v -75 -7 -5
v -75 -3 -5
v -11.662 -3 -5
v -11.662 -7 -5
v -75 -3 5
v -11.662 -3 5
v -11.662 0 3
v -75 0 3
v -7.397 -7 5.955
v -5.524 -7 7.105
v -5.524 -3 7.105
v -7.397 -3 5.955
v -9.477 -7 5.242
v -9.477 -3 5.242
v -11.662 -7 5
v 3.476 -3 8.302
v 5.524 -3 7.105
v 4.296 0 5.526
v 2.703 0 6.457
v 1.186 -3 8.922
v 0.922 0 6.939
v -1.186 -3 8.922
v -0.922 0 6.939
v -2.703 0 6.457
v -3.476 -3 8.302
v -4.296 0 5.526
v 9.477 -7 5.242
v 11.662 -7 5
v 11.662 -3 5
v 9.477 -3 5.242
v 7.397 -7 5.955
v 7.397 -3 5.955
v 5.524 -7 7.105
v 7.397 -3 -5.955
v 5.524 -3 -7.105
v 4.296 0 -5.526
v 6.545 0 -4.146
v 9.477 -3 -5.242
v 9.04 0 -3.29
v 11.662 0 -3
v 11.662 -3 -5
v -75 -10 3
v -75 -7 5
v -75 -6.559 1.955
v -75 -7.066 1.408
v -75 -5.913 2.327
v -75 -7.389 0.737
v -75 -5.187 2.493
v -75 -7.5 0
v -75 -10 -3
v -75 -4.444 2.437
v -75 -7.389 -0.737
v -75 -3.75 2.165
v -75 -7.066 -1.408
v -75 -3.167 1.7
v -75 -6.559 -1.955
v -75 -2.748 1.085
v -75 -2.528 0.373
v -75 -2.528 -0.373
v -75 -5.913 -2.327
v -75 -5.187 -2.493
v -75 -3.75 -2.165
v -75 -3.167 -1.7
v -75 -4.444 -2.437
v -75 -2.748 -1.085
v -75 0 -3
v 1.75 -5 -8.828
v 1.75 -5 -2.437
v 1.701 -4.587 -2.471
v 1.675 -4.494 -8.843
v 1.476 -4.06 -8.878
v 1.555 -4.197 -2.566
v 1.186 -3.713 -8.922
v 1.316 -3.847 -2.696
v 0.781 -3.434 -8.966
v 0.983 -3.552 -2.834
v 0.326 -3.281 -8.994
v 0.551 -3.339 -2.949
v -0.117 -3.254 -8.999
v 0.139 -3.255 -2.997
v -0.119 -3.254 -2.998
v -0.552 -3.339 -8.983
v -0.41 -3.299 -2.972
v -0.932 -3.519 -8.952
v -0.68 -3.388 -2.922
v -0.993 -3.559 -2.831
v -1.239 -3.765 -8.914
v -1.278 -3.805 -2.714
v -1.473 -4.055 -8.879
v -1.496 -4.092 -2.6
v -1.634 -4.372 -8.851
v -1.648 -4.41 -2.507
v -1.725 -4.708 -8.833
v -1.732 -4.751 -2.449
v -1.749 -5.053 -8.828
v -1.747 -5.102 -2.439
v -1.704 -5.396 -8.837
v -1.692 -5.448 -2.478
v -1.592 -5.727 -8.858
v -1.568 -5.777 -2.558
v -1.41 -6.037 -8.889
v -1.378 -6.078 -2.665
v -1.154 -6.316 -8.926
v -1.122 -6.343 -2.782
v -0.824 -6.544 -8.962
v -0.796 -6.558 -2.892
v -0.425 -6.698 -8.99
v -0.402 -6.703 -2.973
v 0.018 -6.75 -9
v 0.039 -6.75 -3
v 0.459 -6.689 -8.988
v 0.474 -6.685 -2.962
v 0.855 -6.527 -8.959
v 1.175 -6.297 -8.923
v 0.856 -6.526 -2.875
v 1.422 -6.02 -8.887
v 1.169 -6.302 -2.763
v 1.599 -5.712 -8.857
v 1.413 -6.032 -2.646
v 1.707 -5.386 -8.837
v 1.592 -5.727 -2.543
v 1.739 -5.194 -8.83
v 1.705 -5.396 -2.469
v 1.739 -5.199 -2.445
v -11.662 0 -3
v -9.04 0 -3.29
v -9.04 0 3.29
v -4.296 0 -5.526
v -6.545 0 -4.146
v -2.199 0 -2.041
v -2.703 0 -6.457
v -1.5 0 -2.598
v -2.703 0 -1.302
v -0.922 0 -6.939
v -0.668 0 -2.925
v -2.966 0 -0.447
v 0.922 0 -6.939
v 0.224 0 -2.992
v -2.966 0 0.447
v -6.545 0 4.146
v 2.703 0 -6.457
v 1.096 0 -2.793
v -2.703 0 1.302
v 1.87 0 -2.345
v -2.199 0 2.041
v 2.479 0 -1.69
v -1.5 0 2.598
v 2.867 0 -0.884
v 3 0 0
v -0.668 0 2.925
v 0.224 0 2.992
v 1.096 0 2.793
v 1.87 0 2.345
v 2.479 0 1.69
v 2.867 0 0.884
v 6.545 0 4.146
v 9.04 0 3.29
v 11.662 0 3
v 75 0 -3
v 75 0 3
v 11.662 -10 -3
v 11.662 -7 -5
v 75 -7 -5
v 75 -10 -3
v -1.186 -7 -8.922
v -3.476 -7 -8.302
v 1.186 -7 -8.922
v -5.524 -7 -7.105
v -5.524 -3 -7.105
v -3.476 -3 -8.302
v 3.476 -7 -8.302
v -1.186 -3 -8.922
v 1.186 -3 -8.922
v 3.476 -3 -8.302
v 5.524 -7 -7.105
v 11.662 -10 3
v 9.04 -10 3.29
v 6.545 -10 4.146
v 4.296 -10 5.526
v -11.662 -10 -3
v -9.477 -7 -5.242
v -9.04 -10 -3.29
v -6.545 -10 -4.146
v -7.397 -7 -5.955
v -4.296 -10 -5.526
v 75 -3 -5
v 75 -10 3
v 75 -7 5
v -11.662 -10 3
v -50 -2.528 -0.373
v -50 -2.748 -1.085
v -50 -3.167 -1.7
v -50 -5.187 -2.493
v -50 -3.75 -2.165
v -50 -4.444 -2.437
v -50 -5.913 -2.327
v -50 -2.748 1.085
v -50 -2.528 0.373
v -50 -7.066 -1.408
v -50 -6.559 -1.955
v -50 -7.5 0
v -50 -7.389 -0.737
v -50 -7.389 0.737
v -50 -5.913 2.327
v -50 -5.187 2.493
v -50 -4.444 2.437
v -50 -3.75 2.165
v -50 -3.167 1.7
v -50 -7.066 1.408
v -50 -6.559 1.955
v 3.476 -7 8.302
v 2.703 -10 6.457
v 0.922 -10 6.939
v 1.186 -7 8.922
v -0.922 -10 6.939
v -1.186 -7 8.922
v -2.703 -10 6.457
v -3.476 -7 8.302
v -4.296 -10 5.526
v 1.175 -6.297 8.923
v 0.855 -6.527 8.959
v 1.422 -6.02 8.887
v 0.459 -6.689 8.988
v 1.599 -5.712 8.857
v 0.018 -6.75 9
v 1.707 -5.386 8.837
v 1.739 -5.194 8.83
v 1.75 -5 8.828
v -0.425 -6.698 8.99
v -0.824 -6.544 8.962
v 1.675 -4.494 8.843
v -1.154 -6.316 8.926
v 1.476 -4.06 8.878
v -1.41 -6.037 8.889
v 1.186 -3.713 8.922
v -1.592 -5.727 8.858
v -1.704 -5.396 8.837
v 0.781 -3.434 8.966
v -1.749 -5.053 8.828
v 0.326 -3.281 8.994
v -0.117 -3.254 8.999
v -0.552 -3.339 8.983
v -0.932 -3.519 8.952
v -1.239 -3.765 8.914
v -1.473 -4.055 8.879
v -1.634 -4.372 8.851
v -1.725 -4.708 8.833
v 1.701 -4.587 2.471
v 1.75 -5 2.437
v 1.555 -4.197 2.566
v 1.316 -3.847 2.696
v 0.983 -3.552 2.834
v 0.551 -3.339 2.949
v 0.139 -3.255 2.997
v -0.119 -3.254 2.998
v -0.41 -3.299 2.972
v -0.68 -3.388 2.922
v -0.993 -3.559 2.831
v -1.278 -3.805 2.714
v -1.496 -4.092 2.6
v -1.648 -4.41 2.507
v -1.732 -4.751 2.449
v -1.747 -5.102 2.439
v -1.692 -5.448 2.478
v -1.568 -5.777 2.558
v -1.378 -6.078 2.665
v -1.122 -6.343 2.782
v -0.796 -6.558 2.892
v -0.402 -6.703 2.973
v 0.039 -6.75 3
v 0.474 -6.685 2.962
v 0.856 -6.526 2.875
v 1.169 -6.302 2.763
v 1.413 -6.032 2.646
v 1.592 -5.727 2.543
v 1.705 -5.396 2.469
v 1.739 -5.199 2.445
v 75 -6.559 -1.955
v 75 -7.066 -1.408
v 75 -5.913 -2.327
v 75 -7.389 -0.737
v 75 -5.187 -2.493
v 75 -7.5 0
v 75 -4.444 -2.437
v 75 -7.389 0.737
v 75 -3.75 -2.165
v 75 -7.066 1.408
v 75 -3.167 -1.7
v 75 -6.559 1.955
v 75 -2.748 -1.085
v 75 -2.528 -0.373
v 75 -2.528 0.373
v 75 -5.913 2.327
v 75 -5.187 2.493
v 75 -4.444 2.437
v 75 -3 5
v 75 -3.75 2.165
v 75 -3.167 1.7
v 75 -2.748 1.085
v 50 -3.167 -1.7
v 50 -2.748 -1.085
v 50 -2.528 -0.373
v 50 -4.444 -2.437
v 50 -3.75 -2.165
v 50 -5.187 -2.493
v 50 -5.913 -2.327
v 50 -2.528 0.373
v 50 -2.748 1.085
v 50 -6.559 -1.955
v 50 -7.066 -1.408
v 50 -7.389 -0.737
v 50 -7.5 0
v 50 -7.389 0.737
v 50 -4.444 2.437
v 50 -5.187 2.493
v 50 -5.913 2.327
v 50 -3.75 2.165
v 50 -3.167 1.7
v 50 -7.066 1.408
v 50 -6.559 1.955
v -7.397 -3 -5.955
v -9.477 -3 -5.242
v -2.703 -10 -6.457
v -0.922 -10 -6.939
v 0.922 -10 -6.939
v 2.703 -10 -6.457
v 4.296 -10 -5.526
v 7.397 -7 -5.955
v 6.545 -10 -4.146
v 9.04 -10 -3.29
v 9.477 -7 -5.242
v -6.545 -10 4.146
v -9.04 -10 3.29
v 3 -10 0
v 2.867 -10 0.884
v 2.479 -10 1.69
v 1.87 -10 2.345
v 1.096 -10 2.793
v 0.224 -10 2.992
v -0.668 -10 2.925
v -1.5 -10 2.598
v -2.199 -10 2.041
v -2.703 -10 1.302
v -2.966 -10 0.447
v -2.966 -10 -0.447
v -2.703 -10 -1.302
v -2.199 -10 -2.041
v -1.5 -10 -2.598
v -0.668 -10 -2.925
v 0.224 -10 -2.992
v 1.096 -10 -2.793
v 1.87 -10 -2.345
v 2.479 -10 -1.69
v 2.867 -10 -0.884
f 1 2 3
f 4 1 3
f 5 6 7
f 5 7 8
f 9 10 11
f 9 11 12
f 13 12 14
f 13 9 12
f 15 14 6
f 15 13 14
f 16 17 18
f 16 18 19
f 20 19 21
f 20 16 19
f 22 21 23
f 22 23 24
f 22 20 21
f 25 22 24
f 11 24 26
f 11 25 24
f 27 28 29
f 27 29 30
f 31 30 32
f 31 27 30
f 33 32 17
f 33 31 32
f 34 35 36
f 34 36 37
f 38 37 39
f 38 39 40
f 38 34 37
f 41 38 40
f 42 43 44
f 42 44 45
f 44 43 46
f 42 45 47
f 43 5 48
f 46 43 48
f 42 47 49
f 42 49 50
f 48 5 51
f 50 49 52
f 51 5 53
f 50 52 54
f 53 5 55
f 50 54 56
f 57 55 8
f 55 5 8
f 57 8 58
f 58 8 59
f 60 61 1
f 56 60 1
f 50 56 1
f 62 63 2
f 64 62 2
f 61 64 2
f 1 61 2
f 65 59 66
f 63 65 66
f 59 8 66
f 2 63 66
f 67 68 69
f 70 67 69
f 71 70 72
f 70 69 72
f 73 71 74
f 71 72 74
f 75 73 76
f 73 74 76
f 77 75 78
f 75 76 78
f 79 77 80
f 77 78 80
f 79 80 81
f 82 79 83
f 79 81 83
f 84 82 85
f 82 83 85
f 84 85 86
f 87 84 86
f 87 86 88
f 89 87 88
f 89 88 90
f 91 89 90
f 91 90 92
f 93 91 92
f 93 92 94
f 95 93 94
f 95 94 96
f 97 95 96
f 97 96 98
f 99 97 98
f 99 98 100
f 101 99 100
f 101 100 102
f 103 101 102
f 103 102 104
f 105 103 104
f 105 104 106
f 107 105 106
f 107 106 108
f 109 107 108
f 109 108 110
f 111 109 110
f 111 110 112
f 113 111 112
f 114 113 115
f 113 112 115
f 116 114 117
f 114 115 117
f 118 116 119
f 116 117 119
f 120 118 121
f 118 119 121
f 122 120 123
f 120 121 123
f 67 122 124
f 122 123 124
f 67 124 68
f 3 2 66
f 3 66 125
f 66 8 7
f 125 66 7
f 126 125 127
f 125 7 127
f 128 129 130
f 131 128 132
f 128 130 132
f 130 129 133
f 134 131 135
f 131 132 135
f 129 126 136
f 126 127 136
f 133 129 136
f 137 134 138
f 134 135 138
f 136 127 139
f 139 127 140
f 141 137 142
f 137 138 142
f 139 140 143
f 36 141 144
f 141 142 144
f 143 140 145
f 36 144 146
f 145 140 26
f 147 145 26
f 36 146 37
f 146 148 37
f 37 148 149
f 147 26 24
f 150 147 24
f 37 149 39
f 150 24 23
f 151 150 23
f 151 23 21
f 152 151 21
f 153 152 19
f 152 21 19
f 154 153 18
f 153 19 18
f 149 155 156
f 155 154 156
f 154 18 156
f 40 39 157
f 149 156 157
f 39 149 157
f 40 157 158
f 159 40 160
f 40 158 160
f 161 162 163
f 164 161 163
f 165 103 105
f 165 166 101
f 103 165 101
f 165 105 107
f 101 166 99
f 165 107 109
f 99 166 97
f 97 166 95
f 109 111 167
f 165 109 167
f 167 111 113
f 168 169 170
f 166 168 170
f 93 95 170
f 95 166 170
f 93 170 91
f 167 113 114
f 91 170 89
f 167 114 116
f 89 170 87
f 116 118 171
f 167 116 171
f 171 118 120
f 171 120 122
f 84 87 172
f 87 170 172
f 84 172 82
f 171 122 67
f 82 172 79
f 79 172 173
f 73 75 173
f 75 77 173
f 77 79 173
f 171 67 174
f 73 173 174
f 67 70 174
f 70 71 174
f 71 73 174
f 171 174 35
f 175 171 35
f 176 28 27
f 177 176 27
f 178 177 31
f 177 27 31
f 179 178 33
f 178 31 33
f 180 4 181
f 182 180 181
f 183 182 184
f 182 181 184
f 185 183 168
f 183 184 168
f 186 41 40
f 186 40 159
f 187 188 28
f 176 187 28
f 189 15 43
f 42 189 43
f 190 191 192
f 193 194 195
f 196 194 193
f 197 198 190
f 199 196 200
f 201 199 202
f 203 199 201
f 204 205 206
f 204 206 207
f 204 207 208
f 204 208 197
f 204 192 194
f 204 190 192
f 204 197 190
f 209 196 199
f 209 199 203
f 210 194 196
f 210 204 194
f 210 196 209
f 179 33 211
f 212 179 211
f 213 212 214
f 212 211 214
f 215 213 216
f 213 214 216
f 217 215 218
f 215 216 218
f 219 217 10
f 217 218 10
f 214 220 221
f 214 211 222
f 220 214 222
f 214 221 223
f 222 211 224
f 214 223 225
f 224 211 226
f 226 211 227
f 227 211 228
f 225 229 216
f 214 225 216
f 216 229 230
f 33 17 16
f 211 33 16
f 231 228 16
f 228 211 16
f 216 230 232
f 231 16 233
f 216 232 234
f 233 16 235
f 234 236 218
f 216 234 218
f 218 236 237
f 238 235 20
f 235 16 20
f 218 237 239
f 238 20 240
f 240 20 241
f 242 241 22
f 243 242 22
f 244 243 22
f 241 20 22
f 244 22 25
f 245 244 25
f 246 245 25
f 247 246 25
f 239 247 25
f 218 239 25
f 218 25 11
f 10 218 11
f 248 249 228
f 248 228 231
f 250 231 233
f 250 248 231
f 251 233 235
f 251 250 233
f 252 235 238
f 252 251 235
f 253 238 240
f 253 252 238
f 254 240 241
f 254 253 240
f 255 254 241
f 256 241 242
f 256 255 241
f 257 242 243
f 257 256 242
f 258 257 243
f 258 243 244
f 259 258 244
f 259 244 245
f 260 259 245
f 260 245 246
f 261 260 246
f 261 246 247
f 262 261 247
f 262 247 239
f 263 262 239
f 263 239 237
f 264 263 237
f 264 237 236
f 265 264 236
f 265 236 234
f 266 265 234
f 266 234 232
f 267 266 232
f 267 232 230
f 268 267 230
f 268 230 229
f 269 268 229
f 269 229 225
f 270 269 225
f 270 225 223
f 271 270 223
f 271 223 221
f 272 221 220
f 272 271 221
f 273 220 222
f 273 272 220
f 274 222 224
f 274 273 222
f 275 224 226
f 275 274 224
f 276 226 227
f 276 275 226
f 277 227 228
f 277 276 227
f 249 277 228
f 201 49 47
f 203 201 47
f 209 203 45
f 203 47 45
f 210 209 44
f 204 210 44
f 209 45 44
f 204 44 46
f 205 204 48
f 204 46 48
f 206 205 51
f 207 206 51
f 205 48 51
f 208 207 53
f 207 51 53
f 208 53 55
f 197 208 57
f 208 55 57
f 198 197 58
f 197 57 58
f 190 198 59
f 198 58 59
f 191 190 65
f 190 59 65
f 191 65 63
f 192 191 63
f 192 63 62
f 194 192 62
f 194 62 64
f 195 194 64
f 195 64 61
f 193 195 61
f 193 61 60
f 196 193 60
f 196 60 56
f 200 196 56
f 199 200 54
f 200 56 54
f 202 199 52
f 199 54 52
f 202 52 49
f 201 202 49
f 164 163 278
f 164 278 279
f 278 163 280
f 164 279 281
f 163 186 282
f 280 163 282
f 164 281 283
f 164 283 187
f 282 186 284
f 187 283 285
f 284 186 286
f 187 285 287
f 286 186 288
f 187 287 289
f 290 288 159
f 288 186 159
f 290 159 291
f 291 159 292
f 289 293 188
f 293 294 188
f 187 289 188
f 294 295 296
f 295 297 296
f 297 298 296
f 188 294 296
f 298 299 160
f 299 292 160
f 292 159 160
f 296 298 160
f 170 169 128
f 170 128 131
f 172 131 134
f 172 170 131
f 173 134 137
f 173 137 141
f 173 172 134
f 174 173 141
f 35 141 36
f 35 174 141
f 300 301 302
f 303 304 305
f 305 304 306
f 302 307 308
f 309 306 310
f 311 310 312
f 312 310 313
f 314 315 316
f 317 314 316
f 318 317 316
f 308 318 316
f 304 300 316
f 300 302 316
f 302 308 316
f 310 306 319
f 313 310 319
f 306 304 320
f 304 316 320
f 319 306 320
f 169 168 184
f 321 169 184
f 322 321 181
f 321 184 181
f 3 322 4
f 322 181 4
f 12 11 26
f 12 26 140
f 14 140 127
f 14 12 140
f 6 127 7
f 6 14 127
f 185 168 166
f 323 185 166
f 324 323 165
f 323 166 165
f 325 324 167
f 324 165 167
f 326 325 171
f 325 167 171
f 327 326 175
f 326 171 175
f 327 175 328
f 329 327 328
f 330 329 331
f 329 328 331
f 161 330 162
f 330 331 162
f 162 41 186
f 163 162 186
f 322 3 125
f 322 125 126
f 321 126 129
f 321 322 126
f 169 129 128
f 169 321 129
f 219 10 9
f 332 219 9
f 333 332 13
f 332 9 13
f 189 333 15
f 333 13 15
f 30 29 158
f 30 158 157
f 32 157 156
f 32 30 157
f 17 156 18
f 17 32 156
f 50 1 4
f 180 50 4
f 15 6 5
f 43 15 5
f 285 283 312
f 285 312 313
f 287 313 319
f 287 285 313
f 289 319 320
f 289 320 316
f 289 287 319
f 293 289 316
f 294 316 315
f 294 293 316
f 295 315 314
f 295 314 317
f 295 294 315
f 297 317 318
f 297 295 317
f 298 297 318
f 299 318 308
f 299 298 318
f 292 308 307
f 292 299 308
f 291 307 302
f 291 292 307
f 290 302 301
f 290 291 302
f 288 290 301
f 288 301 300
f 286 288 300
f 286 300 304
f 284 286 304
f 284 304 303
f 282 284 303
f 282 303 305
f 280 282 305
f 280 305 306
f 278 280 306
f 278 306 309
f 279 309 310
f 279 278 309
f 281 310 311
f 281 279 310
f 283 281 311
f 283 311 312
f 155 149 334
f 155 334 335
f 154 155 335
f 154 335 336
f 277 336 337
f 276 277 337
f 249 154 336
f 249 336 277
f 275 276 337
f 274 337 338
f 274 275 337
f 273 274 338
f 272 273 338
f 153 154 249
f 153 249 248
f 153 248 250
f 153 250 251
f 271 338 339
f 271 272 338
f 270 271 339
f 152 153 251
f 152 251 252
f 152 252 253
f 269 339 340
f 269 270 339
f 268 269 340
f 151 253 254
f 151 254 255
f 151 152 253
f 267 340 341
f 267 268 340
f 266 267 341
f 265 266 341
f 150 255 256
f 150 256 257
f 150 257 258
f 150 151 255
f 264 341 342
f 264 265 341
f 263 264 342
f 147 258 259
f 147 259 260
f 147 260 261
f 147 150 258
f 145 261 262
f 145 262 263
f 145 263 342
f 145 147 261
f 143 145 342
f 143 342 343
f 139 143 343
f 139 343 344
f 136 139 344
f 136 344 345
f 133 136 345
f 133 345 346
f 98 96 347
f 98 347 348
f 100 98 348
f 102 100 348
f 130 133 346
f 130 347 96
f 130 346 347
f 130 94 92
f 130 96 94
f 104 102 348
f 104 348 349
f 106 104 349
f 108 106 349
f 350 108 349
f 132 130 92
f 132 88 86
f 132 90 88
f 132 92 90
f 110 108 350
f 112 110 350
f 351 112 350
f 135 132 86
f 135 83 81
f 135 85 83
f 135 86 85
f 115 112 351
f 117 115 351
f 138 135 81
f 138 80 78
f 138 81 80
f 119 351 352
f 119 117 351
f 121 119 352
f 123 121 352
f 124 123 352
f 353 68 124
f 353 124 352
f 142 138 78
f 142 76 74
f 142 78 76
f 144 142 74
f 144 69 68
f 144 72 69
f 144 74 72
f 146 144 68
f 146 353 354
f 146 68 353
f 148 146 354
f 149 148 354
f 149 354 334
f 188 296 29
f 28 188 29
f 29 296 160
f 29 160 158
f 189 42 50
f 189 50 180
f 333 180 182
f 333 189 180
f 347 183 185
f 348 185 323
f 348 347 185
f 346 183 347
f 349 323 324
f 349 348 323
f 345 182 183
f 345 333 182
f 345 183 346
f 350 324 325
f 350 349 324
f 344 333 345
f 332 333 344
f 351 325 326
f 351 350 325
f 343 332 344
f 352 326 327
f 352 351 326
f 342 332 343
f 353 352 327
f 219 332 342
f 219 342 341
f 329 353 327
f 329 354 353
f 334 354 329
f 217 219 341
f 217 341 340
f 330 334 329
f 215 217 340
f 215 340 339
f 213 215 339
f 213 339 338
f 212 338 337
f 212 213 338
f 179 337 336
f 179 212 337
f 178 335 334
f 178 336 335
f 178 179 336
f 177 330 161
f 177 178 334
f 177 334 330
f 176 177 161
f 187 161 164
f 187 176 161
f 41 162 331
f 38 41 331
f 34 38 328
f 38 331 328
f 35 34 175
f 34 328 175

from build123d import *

# Parameters (mm, degrees)
F0_R          = 3
F1_DEPTH      = 10
F2_R          = 2.5
F3_DEPTH      = 25
F4_R          = 1.75
F5_DEPTH      = 9.001
F5_DEPTH_BACK = 9.001
F6_R          = 10
F7_SIZE2      = 3
F7_SIZE       = 2
F7_2_SIZE2    = 3
F7_2_SIZE     = 2


# Not quite as in the source:
# - a pattern or mirror of a feature is missing from the dataset's text; its kind, count and spacing are read off the source's solid


with BuildPart() as f1:
    # F0 (on Front) → F1 (new body)
    with BuildSketch(Plane.XZ):
        with BuildLine():
            Line((75, 5), (7.4833147735, 5))
            ThreePointArc((7.4833147735, 5), (0, 9), (-7.4833147735, 5))
            Line((-7.4833147735, 5), (-75, 5))
            Line((-75, 5), (-75, -5))
            Line((-75, -5), (-7.4833147735, -5))
            ThreePointArc((-7.4833147735, -5), (0, -9), (7.4833147735, -5))
            Line((7.4833147735, -5), (75, -5))
            Line((75, -5), (75, 5))
        make_face()
        Circle(F0_R, mode=Mode.SUBTRACT)
    extrude(amount=F1_DEPTH)

    # F2 (on face) → F3 (cut)
    with BuildSketch(Plane(origin=(-75, 0, 0), x_dir=(0, -1, 0), z_dir=(-1, 0, 0))):
        with Locations((5, 0)):
            Circle(F2_R)
    f3 = extrude(amount=-F3_DEPTH, mode=Mode.SUBTRACT)

    # F3_copies: F3 across plane
    add(f3.mirror(Plane(origin=(0, 0, 0), x_dir=(0, 0, 1), z_dir=(1, 0, 0))), mode=Mode.SUBTRACT)

    # F4 (on Top) → F5 (cut, two sides)
    with BuildSketch(Plane.XY) as f5_sk:
        with Locations((0, -5)):
            Circle(F4_R)
    extrude(amount=-F5_DEPTH, mode=Mode.SUBTRACT)
    extrude(f5_sk.sketch, amount=F5_DEPTH_BACK, mode=Mode.SUBTRACT)

    # F6
    f6_edges = [f1.edges().sort_by_distance(p)[0] for p in [
        (-7.483315, -5, 5),
        (7.483315, -5, 5),
        (7.483315, -5, -5),
        (-7.483315, -5, -5),
    ]]
    fillet(f6_edges, radius=F6_R)

    # F7
    f7_edges = [f1.edges().sort_by_distance(p)[0] for p in [
        (-43.330952, -10, 5),
        (-43.330952, -10, -5),
    ]]
    f7_side = f1.faces().sort_by_distance((43.330952, -10, -3.489239))[0]
    chamfer(f7_edges, length=F7_SIZE, length2=F7_SIZE2, reference=f7_side)

    # F7#2
    f7_2_edges = [f1.edges().sort_by_distance(p)[0] for p in [
        (-43.330952, 0, 5),
        (-43.330952, 0, -5),
    ]]
    f7_2_side = f1.faces().sort_by_distance((43.330952, 0, -3.489239))[0]
    chamfer(f7_2_edges, length=F7_2_SIZE, length2=F7_2_SIZE2, reference=f7_2_side)


solid = f1.part
